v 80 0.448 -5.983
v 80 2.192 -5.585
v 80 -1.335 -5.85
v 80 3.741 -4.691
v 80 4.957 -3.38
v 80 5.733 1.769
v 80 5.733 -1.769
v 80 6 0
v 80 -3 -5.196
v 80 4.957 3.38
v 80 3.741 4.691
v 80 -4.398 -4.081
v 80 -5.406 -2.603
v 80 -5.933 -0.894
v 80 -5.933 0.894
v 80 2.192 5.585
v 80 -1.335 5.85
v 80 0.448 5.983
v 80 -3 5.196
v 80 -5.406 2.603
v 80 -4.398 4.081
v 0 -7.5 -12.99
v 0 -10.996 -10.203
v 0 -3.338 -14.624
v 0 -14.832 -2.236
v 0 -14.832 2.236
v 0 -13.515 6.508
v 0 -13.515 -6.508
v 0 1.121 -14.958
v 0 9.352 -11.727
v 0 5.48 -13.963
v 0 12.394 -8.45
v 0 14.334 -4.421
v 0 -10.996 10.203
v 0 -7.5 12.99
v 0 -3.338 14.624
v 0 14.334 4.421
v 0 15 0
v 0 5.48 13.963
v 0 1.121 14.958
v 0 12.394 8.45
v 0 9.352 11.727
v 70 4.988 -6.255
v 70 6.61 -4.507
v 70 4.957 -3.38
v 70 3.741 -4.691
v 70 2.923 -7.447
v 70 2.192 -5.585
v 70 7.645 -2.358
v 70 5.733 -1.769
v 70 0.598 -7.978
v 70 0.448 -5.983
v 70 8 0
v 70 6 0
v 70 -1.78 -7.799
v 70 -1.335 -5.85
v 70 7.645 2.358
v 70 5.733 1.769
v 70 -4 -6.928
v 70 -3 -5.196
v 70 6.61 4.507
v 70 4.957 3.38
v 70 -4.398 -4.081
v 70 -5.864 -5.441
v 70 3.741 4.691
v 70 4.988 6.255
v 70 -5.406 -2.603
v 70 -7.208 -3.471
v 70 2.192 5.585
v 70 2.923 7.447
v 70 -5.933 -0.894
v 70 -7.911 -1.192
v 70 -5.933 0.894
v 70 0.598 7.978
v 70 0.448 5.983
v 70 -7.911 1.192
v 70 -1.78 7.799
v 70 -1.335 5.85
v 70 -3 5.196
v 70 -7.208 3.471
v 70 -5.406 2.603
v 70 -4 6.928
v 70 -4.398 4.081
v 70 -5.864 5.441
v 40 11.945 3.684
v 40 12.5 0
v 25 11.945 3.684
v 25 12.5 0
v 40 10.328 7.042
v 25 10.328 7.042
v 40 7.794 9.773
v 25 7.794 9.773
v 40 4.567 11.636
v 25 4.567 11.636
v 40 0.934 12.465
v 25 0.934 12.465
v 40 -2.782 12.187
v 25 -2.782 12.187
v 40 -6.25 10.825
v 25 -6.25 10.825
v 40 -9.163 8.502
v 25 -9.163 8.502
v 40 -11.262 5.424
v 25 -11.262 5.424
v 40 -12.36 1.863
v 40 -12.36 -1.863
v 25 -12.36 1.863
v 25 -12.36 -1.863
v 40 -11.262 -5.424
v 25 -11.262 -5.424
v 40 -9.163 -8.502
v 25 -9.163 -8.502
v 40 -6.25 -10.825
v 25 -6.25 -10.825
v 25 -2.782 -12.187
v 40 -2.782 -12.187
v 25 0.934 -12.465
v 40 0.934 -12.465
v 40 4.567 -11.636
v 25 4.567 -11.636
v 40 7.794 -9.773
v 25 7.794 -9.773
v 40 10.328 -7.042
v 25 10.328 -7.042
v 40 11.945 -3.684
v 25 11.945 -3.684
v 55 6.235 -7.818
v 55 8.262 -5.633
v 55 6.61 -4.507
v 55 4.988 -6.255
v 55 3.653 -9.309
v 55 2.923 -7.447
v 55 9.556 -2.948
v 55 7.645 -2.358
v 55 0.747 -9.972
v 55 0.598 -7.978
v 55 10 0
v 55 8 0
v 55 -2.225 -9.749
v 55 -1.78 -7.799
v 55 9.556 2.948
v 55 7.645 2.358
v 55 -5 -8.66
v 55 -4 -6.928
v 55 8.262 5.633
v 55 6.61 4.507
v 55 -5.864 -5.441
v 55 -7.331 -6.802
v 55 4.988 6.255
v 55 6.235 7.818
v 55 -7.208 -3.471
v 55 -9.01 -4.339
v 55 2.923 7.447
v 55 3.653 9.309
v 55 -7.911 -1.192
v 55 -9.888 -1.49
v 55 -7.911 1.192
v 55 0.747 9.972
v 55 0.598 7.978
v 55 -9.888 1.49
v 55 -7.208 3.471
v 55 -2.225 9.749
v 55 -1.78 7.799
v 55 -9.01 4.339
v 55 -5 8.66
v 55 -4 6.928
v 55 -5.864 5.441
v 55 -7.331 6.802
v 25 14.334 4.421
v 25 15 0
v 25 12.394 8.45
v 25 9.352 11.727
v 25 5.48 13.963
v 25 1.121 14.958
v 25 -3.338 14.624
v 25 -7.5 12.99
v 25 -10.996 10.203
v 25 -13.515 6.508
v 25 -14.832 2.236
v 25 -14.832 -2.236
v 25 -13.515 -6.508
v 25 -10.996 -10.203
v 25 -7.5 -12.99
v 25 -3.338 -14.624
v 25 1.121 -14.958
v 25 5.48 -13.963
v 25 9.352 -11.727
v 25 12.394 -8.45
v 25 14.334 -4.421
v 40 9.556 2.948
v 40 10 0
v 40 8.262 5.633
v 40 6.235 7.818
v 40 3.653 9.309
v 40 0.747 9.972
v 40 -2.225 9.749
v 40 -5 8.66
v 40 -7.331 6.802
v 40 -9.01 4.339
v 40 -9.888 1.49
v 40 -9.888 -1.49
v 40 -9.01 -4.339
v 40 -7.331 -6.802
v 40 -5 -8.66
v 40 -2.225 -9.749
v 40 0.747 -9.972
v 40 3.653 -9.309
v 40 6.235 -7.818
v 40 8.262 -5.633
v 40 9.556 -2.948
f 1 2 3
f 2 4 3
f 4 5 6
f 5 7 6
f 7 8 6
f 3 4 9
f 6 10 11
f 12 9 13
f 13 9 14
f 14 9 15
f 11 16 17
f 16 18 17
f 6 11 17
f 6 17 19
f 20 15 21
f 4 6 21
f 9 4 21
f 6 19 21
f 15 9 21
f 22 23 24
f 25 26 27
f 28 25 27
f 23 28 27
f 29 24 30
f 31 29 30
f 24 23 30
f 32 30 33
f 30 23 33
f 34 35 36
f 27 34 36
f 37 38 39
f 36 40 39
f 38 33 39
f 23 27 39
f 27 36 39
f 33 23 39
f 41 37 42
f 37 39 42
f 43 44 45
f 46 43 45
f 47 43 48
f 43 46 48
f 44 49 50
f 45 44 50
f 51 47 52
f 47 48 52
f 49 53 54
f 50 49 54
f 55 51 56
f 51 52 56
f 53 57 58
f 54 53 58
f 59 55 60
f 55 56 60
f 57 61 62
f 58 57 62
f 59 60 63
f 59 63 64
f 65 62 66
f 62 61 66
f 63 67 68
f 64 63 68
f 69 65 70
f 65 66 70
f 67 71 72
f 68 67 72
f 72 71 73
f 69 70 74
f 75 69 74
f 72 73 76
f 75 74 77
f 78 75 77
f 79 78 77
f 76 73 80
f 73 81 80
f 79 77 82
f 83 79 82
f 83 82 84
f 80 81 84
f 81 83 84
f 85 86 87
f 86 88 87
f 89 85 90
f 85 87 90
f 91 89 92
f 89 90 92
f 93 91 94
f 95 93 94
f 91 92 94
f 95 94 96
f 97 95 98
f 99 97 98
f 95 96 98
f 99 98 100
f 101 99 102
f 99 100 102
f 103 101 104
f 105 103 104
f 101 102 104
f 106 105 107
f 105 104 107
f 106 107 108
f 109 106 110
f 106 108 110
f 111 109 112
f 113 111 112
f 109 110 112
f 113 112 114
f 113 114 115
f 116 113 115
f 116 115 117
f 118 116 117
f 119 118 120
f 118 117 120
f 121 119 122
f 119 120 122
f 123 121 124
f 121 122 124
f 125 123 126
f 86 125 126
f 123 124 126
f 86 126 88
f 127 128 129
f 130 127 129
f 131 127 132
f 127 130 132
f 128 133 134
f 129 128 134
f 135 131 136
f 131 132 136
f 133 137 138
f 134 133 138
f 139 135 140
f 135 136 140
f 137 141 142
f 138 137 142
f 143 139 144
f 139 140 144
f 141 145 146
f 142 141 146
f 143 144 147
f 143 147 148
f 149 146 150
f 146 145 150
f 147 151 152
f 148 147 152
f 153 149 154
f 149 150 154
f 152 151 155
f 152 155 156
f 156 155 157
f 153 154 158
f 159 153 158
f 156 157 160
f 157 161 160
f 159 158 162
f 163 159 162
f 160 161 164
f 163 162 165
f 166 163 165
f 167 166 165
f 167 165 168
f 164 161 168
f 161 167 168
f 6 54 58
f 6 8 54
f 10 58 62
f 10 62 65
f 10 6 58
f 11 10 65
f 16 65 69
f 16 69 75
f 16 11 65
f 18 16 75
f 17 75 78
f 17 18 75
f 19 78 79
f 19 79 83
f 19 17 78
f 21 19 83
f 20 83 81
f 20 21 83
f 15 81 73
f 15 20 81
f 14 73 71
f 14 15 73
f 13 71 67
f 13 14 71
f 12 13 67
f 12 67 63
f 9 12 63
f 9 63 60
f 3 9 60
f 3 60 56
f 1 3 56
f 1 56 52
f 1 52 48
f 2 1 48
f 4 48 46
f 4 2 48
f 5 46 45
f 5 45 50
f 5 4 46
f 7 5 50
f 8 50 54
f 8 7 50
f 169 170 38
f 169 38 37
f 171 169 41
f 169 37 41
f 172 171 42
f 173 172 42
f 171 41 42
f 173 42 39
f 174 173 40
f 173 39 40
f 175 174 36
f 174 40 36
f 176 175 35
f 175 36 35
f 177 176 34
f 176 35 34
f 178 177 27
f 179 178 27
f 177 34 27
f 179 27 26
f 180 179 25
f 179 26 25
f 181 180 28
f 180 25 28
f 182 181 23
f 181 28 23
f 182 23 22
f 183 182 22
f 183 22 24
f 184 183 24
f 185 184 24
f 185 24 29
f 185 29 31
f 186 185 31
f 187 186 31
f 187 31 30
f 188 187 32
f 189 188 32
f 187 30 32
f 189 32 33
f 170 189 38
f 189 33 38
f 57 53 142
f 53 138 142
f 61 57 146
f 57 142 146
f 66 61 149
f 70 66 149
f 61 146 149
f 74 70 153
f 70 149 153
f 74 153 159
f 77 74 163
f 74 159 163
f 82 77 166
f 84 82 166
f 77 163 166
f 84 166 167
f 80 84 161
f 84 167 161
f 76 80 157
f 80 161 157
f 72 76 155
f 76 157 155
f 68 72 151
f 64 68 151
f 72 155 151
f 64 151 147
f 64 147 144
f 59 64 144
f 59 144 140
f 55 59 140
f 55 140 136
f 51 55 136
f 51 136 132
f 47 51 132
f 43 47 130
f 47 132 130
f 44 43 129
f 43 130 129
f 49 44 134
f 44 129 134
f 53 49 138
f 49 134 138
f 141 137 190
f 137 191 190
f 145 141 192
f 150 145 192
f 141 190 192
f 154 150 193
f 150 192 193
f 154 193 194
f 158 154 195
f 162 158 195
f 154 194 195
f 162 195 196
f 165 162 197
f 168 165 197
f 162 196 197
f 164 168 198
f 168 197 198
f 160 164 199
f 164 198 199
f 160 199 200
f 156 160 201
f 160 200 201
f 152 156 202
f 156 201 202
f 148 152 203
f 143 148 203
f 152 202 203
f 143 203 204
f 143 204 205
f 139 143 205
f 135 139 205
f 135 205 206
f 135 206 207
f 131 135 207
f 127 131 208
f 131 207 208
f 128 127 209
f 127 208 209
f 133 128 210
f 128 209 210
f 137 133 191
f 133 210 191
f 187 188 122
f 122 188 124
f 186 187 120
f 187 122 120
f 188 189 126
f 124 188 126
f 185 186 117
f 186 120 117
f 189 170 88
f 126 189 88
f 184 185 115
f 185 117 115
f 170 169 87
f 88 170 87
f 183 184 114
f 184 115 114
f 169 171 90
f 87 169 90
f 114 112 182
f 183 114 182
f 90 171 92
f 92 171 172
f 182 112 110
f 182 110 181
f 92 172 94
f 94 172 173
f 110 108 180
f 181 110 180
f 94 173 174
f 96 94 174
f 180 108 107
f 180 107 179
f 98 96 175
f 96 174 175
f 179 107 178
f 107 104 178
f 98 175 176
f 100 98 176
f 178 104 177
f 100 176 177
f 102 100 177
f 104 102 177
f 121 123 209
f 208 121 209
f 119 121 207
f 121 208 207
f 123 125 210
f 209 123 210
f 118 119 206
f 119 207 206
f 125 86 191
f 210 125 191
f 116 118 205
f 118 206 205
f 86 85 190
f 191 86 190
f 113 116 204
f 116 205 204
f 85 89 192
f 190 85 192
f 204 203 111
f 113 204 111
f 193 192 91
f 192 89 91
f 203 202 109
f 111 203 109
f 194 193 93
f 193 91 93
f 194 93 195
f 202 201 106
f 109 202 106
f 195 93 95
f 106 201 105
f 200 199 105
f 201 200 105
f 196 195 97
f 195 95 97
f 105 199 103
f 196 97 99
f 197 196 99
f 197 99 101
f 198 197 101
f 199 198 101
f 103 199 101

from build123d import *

# Parameters (mm, degrees)
F0_W = 10
F0_H = 6


with BuildPart() as f1:
    # F0 (on Top) → F1 (revolve)
    with BuildSketch(Plane.XY):
        Polygon((0, 0), (25, 0), (25, 12.5), (25, 15), (0, 15), align=None)
        Polygon((25, 0), (40, 0), (40, 10), (40, 12.5), (25, 12.5), align=None)
        Polygon((40, 0), (55, 0), (55, 8), (55, 10), (40, 10), align=None)
        Polygon((55, 0), (70, 0), (70, 6), (70, 8), (55, 8), align=None)
        with Locations((75, 3)):
            Rectangle(F0_W, F0_H)
    revolve(axis=Axis((32.5, 0, 0), (1, 0, 0)))


solid = f1.part
